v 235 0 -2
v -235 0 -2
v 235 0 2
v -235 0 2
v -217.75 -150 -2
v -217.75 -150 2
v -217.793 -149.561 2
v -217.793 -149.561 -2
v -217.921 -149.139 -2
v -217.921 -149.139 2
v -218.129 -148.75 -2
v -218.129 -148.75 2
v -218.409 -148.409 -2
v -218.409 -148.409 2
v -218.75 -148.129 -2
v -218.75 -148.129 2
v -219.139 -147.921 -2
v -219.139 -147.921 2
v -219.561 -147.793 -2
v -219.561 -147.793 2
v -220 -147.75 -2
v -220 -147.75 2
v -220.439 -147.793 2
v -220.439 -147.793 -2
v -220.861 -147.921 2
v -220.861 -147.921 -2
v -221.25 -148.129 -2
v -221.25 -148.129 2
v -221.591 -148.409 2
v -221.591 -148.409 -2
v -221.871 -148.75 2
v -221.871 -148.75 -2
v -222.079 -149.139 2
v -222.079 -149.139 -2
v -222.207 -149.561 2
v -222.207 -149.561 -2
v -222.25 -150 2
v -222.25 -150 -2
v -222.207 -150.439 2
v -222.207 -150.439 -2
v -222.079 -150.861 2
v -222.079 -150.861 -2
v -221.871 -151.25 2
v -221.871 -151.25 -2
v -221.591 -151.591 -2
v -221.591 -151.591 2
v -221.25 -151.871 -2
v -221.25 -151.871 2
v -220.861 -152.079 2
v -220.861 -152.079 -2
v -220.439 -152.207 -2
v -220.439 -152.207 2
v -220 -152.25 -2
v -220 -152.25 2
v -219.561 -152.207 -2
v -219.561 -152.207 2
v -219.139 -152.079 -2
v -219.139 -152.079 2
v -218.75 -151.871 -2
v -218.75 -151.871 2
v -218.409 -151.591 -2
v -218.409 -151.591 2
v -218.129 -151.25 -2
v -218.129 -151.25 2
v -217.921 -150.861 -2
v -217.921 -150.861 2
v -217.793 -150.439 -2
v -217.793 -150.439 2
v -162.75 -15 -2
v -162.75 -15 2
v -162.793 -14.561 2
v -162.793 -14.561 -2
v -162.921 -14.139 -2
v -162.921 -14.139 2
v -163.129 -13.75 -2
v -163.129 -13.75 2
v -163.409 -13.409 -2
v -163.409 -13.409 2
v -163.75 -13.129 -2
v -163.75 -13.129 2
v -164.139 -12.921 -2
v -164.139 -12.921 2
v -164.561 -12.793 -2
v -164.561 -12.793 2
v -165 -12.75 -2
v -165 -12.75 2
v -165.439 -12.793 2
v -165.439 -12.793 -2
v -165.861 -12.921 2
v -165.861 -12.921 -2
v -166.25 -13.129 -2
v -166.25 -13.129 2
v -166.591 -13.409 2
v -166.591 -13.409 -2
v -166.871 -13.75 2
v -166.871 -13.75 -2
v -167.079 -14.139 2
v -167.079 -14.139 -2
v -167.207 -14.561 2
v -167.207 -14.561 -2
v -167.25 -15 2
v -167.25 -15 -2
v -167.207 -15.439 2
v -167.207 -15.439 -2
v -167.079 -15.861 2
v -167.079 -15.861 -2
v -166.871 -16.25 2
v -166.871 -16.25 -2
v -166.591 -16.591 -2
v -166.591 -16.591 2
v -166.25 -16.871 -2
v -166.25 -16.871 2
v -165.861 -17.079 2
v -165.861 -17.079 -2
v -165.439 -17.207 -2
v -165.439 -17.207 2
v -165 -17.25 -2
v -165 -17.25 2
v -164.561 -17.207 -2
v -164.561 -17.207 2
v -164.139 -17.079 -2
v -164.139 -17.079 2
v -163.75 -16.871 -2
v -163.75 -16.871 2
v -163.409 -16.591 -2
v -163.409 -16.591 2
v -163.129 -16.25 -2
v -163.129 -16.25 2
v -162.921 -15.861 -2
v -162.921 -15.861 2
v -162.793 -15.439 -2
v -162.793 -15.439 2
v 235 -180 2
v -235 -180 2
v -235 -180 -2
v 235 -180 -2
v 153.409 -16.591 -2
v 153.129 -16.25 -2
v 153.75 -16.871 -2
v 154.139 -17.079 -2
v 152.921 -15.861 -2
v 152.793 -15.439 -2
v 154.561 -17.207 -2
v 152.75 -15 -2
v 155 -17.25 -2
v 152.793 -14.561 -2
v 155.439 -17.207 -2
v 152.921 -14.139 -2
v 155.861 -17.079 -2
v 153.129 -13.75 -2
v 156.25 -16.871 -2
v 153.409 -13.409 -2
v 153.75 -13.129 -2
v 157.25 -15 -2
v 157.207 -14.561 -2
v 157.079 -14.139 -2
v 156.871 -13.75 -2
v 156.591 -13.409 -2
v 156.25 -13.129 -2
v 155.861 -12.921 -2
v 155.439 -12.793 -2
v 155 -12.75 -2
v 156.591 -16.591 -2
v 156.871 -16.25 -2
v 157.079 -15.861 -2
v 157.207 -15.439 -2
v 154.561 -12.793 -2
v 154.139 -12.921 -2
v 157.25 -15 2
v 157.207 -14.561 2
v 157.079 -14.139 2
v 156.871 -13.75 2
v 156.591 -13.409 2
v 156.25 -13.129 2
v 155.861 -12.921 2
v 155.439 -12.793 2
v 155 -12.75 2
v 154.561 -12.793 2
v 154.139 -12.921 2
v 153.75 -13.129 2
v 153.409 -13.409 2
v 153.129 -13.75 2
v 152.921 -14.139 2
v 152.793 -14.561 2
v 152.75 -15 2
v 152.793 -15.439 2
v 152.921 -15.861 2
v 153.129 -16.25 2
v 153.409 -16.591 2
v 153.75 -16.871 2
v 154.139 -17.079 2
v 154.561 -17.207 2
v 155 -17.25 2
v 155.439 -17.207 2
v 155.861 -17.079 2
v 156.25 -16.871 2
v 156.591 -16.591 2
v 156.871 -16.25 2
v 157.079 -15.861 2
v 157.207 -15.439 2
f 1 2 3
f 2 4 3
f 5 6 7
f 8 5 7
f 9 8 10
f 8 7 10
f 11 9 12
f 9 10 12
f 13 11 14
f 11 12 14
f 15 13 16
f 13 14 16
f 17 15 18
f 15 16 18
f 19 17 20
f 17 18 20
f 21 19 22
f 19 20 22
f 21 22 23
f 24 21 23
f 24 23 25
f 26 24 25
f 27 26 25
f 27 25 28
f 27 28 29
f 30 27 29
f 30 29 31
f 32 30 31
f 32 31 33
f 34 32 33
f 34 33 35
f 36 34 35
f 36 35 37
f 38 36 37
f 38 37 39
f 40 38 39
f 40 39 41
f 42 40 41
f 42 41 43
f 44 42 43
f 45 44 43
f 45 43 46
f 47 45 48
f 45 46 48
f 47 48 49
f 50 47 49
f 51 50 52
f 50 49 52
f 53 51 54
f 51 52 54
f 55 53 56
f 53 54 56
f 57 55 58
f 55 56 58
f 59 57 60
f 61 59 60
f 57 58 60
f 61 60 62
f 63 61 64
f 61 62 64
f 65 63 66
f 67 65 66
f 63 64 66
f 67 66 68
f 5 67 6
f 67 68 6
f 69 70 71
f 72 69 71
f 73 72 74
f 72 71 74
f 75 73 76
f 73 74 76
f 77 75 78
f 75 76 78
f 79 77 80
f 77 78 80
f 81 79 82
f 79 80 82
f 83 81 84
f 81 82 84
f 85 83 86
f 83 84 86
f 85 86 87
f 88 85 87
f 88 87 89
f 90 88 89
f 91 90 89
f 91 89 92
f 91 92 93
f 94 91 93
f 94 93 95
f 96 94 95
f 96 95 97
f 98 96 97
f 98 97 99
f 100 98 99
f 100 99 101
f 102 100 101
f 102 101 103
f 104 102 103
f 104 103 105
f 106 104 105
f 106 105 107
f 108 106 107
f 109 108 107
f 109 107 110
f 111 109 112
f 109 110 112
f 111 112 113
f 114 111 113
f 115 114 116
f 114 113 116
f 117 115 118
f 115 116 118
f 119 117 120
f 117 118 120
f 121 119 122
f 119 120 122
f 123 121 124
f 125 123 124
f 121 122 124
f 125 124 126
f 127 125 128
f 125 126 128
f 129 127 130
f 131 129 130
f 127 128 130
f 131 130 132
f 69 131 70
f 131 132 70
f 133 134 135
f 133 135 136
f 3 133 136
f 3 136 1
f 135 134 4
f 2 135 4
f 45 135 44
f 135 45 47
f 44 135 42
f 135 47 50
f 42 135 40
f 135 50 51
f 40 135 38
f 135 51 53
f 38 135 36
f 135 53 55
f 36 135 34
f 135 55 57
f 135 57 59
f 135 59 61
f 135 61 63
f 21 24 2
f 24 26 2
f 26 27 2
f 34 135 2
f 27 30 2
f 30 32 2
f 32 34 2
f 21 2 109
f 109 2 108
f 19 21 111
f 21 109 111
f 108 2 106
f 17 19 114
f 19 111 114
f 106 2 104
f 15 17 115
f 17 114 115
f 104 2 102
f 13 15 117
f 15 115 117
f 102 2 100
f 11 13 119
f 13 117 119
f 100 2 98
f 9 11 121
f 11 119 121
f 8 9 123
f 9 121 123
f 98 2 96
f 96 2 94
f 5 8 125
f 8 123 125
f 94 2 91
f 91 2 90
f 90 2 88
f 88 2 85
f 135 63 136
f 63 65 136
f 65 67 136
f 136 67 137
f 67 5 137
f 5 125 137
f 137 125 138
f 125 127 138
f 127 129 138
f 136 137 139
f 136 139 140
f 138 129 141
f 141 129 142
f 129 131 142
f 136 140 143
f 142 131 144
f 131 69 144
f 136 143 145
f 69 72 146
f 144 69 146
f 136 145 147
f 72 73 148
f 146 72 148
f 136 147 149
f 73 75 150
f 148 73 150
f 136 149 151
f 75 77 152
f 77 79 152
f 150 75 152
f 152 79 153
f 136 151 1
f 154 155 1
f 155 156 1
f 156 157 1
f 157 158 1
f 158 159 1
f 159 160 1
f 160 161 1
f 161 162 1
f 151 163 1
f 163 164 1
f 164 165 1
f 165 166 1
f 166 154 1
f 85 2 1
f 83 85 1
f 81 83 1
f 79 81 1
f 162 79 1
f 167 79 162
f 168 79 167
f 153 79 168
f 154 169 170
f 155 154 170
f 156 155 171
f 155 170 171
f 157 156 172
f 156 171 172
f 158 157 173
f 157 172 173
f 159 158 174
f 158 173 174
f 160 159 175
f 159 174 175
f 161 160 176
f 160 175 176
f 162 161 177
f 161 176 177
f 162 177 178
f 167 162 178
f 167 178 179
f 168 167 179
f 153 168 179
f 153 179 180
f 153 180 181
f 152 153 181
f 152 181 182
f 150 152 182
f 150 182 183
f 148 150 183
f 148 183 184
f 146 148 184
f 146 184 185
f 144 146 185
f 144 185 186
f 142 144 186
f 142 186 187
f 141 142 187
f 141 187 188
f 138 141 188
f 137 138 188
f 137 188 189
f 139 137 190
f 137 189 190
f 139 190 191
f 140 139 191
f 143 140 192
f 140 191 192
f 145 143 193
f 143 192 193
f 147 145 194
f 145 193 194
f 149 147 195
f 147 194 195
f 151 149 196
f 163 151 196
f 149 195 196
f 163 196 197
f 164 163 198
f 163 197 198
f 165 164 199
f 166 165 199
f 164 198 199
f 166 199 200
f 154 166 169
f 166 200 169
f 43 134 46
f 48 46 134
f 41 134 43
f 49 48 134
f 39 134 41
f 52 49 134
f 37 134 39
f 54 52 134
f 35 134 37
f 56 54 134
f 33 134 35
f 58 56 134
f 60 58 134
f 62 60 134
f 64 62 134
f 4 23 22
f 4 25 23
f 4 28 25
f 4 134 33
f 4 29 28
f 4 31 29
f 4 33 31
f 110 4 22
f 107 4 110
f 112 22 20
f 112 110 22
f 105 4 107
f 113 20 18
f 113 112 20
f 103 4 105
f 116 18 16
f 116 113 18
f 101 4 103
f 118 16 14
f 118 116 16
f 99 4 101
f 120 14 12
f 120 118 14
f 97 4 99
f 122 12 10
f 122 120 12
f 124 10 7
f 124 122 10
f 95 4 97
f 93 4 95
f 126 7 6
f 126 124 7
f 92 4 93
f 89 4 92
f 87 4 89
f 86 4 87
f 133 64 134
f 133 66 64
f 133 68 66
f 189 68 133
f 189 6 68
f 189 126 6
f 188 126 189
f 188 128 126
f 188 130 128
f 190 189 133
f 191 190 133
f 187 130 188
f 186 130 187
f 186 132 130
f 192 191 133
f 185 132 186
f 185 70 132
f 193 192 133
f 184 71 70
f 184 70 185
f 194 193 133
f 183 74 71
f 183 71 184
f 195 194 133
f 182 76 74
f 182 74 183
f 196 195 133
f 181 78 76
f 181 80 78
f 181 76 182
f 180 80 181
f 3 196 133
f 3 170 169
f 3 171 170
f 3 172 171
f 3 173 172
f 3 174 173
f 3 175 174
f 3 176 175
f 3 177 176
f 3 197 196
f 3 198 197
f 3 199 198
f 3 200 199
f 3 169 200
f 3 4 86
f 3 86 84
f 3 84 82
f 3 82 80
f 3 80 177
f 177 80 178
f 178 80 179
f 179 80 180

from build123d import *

# Parameters (mm, degrees)
SKETCH1_W           = 470
SKETCH1_H           = 180
BOSS_EXTRUDE1_DEPTH = 2
SKETCH2_R           = 2.25
CUT_EXTRUDE1_DEPTH  = 297.042226718


with BuildPart() as part:
    # Sketch1 → Boss-Extrude1 (new, symmetric)
    with BuildSketch(Plane.XY):
        with Locations((0, -90)):
            Rectangle(SKETCH1_W, SKETCH1_H)
    extrude(amount=BOSS_EXTRUDE1_DEPTH, both=True)

    # Sketch2 → Cut-Extrude1 (cut, through all)
    with BuildSketch(Plane.XY.offset(2)):
        with Locations((-165, -15)):
            Circle(SKETCH2_R)
        with Locations((155, -15)):
            Circle(SKETCH2_R)
        with Locations((-220, -150)):
            Circle(SKETCH2_R)
    extrude(amount=-CUT_EXTRUDE1_DEPTH, mode=Mode.SUBTRACT)


solid = part.part
